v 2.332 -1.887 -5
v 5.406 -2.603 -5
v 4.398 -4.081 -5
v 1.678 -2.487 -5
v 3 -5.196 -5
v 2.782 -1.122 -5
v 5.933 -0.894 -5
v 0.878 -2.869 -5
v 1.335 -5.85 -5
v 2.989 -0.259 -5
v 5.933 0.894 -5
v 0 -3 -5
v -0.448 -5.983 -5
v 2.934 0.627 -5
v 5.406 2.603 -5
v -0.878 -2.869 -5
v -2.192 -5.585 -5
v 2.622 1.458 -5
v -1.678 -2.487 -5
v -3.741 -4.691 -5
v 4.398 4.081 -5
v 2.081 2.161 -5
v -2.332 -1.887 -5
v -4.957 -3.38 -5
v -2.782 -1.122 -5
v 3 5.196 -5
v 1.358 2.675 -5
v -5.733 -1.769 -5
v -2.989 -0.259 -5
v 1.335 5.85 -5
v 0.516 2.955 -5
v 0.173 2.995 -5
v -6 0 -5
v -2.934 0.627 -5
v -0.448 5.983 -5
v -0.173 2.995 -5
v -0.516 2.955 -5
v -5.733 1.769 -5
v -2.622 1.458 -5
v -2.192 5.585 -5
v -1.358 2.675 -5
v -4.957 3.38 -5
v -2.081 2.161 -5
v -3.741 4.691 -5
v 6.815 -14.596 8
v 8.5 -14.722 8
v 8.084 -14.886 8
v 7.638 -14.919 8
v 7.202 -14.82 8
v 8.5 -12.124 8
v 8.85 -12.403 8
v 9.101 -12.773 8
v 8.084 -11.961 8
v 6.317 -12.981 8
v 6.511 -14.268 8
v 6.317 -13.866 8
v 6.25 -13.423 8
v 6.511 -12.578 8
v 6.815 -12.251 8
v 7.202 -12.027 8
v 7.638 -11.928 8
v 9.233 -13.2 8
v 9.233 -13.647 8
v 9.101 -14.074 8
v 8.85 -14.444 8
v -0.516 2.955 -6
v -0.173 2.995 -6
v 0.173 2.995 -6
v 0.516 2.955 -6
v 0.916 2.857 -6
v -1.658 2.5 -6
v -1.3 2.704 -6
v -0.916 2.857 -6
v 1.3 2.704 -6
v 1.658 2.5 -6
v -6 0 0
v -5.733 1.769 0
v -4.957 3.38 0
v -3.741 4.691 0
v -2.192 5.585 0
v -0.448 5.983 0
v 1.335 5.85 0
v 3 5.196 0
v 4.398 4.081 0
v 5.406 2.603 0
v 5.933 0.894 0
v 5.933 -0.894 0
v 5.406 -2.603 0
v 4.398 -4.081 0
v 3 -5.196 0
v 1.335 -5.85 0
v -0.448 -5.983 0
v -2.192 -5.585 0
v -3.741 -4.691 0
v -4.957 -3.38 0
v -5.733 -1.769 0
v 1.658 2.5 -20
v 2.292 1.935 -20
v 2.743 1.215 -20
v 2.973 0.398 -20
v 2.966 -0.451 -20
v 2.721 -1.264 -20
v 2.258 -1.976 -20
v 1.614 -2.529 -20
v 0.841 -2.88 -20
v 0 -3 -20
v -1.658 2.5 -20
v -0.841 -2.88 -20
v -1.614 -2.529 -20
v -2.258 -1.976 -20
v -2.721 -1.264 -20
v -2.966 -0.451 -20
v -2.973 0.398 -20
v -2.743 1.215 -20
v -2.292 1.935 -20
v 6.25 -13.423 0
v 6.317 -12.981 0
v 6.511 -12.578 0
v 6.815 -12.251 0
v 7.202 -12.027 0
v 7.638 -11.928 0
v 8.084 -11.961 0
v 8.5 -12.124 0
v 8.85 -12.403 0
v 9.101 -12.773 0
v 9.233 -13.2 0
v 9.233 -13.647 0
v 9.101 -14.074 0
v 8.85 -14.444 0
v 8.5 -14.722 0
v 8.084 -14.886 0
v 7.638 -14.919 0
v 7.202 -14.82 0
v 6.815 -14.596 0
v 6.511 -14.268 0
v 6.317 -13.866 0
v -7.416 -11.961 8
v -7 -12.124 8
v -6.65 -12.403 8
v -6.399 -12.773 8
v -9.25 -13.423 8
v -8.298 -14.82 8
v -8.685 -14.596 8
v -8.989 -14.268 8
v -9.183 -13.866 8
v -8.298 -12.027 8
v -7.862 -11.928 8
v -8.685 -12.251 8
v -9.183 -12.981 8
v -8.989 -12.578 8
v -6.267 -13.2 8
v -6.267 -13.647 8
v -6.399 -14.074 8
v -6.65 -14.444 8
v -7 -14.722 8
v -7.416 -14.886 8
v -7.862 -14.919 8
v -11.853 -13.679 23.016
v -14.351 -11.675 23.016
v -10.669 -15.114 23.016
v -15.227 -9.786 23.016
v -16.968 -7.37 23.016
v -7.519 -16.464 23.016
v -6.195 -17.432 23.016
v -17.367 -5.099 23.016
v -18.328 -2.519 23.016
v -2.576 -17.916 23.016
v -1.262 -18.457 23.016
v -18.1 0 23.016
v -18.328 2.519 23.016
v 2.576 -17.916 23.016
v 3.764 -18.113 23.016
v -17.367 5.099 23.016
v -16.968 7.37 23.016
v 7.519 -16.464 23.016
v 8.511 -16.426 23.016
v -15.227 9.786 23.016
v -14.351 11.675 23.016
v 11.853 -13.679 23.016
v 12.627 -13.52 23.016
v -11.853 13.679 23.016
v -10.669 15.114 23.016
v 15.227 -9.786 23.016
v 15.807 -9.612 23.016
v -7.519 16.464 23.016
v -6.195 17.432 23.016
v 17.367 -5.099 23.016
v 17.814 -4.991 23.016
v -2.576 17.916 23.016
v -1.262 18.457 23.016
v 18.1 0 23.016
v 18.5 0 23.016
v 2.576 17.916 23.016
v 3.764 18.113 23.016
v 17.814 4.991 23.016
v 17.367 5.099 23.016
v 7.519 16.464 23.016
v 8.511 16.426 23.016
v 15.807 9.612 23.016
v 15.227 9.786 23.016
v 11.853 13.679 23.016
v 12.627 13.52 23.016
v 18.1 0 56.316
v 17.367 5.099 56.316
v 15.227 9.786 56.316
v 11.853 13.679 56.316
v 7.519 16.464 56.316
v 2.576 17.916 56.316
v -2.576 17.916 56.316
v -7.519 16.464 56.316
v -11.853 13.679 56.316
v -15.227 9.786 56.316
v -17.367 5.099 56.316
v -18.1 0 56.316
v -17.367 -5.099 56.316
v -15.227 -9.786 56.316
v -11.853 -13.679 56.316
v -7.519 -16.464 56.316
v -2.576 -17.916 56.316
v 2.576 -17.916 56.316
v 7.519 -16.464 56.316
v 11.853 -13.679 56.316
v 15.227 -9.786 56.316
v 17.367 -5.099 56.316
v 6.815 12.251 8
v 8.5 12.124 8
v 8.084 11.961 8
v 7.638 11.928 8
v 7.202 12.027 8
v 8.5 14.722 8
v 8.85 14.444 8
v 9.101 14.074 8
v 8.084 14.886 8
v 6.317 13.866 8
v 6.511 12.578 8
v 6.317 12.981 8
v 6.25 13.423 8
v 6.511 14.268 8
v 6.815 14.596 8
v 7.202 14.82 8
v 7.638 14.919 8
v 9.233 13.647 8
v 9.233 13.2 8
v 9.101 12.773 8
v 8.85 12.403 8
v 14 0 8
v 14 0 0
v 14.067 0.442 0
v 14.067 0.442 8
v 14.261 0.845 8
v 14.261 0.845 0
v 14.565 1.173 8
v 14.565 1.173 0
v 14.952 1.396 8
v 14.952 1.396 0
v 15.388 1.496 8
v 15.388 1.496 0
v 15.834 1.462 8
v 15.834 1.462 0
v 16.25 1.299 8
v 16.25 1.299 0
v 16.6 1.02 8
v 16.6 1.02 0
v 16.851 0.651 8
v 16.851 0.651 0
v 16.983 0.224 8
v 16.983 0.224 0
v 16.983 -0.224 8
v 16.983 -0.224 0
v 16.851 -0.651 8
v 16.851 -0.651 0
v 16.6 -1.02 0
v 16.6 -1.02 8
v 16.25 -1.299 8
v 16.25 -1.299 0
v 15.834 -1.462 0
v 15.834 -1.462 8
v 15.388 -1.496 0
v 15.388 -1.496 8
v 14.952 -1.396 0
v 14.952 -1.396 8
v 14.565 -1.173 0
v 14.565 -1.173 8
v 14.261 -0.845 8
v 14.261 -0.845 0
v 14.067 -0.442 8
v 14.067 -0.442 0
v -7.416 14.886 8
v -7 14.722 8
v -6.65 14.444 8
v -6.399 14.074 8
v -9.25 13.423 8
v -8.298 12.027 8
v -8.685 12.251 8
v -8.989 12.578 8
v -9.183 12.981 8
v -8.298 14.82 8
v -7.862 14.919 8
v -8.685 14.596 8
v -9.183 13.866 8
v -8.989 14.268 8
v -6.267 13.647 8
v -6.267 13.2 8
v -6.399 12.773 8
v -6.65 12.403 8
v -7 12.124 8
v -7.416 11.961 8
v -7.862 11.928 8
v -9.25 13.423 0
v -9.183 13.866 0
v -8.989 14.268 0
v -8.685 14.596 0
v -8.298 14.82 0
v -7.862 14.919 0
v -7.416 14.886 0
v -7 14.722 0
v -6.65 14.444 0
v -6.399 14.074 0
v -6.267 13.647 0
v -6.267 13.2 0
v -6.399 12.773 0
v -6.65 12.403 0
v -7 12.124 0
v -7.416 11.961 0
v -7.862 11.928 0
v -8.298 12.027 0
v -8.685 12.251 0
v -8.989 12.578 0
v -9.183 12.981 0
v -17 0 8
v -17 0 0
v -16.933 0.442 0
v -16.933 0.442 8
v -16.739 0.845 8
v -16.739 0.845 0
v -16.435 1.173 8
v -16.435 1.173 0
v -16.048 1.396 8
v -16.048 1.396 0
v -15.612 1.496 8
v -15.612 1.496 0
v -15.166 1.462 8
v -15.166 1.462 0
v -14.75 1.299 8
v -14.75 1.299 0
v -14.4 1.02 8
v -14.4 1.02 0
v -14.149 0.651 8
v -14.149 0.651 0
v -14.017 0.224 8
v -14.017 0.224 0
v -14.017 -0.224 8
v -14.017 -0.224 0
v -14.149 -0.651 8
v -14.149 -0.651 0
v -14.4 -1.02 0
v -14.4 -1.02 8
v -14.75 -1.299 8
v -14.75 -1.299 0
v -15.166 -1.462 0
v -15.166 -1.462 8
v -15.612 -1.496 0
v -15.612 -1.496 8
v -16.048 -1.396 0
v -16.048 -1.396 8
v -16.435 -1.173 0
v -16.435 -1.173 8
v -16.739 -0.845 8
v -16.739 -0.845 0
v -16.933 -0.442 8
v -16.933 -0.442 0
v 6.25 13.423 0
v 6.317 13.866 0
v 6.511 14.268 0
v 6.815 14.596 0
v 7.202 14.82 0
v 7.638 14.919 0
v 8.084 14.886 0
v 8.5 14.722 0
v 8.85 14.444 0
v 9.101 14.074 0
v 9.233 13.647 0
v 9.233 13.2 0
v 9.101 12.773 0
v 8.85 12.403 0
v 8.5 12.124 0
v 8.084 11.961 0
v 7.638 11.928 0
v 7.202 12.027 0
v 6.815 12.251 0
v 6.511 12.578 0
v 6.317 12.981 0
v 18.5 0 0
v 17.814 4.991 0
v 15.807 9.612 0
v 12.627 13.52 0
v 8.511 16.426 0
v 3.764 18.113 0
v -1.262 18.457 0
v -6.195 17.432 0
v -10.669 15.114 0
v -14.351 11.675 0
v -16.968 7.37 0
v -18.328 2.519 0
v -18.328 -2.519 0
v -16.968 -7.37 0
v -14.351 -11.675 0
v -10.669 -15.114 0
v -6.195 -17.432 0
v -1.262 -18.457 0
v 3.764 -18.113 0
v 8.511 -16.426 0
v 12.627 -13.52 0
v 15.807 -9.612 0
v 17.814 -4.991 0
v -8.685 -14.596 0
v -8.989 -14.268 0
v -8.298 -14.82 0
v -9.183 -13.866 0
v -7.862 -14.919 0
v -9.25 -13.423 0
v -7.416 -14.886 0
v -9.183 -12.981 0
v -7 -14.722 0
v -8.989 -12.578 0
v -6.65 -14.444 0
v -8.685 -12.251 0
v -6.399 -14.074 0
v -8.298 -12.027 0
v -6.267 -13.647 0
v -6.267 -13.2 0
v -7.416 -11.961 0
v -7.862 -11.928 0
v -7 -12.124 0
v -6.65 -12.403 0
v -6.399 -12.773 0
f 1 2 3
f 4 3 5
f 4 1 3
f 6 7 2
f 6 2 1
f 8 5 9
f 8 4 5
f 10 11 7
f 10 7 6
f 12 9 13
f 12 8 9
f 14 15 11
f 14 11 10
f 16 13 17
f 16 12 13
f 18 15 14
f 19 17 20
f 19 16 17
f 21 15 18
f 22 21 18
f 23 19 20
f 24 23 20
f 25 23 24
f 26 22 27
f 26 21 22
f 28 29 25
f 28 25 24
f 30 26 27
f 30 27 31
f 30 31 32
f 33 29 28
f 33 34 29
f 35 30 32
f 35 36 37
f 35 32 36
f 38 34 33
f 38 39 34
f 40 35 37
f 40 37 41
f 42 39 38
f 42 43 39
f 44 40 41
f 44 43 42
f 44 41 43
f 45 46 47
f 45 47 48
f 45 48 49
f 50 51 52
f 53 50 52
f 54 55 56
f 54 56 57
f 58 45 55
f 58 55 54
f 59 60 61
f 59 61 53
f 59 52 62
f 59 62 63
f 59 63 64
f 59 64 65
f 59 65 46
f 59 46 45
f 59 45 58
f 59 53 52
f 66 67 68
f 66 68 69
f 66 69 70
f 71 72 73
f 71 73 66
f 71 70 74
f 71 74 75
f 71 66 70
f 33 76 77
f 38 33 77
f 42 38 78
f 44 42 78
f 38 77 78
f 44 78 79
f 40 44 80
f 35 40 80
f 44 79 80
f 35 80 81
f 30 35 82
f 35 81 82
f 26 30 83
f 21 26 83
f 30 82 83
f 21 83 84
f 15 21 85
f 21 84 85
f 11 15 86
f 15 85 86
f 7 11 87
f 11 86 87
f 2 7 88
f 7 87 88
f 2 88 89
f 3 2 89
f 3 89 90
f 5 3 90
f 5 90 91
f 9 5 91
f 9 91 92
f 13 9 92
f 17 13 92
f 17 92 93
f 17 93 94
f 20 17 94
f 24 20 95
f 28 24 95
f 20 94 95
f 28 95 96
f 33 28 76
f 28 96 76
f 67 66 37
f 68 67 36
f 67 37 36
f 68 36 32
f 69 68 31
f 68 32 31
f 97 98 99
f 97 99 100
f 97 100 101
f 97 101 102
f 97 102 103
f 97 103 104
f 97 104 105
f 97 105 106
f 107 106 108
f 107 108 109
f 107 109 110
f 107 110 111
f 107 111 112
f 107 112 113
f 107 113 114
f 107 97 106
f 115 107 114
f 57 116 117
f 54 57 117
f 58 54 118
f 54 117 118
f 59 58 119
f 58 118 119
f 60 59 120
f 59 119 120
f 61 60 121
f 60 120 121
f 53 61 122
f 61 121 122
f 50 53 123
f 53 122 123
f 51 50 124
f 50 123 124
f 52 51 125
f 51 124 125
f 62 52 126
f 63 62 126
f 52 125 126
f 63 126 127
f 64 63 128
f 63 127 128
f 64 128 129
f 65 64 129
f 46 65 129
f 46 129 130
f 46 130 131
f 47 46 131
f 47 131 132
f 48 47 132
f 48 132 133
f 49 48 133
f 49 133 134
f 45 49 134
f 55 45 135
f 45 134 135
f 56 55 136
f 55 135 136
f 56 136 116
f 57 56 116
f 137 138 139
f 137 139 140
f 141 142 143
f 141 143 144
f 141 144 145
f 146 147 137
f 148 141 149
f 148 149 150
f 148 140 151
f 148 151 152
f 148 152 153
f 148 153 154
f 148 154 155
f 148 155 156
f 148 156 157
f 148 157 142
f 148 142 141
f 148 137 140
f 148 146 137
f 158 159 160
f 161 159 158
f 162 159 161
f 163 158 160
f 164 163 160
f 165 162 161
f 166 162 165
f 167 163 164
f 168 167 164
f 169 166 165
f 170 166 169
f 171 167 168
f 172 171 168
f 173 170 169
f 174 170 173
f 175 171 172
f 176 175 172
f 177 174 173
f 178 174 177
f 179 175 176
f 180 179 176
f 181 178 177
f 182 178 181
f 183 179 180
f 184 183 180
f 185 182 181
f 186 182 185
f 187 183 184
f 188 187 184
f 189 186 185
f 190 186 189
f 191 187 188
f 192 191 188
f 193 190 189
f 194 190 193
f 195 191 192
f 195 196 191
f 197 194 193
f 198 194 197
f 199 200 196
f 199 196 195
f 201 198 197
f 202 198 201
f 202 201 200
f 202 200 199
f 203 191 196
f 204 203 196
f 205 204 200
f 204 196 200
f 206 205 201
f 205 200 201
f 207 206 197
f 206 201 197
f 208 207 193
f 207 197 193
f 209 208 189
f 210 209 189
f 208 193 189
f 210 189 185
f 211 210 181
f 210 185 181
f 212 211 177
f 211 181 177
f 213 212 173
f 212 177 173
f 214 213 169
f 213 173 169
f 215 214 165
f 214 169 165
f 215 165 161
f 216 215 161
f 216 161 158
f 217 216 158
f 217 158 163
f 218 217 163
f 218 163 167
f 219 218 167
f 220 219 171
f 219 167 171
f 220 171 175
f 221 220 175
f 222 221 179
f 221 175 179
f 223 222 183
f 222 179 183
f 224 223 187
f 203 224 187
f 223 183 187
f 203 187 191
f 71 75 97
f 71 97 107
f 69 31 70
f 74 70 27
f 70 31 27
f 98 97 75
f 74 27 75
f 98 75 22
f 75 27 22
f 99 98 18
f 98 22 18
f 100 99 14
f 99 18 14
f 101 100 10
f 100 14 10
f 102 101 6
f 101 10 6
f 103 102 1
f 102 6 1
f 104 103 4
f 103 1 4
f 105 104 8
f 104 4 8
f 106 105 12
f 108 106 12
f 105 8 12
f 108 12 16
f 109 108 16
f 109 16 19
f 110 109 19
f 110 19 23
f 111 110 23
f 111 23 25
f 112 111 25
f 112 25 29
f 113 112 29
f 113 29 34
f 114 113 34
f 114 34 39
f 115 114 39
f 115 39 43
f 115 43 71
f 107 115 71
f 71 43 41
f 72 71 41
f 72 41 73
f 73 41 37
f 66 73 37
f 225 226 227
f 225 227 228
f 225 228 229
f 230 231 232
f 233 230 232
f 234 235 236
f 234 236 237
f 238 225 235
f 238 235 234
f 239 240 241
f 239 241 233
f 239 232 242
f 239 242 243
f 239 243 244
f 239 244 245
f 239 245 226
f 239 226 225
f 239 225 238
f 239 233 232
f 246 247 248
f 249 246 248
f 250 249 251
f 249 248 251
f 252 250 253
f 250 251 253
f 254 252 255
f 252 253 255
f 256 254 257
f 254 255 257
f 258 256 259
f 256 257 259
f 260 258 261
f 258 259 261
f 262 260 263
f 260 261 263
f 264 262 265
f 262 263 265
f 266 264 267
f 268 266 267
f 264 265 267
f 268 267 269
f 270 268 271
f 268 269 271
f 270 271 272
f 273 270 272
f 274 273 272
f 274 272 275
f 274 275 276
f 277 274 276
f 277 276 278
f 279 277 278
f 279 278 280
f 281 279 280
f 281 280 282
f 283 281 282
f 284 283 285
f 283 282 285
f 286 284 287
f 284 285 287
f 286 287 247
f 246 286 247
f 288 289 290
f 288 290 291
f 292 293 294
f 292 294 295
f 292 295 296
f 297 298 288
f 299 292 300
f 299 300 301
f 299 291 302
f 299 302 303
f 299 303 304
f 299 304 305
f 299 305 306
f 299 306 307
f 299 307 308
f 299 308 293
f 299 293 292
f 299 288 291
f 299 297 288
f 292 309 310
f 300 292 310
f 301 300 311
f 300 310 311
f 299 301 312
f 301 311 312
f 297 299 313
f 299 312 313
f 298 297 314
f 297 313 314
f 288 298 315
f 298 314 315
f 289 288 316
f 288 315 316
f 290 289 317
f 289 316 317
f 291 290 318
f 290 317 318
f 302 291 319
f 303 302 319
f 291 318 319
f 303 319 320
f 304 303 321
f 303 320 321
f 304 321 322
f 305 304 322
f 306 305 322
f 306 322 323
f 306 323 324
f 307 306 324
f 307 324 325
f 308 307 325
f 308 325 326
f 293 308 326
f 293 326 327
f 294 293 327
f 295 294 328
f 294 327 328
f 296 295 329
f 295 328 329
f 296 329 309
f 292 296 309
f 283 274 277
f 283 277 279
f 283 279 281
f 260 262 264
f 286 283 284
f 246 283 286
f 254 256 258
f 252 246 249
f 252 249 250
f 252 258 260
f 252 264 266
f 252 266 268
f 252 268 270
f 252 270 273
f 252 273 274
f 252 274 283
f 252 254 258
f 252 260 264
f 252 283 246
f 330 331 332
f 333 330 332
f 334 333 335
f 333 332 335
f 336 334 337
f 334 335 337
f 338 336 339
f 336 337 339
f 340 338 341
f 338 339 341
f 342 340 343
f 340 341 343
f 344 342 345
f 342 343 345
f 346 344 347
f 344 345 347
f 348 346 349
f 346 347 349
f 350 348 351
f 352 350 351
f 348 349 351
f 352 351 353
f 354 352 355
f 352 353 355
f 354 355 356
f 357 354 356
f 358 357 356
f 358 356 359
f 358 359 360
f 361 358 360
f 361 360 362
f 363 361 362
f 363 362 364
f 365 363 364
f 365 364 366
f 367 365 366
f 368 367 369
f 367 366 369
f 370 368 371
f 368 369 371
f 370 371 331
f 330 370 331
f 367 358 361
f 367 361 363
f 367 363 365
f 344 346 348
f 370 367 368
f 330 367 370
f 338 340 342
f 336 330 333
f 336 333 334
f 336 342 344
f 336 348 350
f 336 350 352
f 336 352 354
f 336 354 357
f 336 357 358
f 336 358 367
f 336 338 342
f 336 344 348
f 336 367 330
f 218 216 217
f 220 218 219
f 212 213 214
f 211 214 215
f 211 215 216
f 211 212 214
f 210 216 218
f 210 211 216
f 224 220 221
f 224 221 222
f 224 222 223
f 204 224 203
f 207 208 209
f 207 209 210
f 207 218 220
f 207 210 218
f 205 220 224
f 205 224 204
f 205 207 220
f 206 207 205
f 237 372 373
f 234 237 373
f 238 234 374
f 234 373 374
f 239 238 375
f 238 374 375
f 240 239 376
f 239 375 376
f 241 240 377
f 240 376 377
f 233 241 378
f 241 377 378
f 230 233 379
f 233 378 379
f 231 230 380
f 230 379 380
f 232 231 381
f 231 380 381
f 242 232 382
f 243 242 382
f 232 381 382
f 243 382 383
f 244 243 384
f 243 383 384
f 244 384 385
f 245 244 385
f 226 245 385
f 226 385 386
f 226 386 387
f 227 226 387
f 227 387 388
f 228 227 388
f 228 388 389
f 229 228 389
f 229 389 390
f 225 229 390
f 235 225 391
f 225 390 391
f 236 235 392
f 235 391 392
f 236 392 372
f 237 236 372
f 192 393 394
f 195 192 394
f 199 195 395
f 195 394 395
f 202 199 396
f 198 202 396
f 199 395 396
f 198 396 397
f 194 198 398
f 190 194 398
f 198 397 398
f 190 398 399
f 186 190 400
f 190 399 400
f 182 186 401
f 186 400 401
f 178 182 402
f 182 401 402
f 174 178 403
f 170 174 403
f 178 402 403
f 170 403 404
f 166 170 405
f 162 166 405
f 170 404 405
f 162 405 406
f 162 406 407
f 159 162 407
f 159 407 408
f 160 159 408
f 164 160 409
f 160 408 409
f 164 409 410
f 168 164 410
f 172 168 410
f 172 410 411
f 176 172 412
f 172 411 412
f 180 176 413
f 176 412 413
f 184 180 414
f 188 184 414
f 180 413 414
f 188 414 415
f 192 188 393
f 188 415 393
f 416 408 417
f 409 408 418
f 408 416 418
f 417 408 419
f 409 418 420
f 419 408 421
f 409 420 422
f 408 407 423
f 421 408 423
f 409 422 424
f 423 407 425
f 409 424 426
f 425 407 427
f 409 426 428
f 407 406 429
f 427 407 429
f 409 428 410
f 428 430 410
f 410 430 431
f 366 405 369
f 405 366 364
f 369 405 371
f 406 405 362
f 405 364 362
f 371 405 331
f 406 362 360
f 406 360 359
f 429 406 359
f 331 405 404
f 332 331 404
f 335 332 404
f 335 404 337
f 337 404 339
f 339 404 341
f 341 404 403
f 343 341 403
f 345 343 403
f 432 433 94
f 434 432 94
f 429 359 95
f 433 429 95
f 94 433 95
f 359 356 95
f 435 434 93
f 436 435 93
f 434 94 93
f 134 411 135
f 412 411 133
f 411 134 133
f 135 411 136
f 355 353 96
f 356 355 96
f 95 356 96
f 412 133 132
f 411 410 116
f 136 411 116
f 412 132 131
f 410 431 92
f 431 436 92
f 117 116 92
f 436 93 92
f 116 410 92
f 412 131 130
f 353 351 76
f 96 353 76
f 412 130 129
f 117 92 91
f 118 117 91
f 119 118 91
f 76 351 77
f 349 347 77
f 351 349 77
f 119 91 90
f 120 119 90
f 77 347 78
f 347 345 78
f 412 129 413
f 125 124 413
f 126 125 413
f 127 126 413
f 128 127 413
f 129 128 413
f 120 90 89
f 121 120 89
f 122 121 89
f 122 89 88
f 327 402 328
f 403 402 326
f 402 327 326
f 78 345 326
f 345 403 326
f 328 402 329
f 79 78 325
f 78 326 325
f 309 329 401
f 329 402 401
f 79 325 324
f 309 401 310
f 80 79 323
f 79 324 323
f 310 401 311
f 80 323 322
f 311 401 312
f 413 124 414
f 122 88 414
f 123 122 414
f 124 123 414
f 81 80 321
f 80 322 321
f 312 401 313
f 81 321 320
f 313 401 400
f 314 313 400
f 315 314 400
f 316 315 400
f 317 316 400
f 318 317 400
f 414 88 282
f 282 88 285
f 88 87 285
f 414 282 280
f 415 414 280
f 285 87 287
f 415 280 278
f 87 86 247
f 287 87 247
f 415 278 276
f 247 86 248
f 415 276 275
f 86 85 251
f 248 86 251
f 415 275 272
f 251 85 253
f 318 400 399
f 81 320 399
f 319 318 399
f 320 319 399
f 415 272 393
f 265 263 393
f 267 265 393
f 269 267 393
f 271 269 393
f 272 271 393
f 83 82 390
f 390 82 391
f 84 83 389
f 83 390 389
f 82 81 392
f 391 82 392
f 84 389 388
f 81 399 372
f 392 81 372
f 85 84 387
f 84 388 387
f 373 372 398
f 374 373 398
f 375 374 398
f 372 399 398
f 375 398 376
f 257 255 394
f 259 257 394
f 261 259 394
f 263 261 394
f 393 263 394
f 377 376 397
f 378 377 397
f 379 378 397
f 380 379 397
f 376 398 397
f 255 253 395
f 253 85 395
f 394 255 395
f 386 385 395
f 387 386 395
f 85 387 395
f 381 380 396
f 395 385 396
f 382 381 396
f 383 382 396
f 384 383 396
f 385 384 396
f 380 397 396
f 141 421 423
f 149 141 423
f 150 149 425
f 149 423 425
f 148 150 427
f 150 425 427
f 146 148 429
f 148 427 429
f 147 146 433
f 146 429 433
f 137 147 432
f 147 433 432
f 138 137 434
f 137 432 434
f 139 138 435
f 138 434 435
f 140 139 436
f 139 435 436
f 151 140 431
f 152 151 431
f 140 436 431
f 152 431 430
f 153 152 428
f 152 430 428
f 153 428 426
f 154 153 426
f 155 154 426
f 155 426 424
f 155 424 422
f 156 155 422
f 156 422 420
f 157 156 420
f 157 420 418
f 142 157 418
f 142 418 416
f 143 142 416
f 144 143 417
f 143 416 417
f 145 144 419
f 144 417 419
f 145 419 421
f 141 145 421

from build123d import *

# Parameters (mm, degrees)
SKETCH1_R           = 18.5
BOSS_EXTRUDE1_DEPTH = 23.016176471
SKETCH2_R           = 18.1
BOSS_EXTRUDE2_DEPTH = 33.3
SKETCH3_R           = 6
BOSS_EXTRUDE3_DEPTH = 5
BOSS_EXTRUDE4_DEPTH = 15
CUT_EXTRUDE1_START  = -14
CUT_EXTRUDE1_DEPTH  = 14
SKETCH6_R           = 1.5
CUT_EXTRUDE2_DEPTH  = 8


with BuildPart() as part:
    # Sketch1 → Boss-Extrude1 (new body)
    with BuildSketch(Plane.XY):
        Circle(SKETCH1_R)
    extrude(amount=BOSS_EXTRUDE1_DEPTH)

    # Sketch2 → Boss-Extrude2 (add)
    with BuildSketch(Plane.XY.offset(23.016176471)):
        Circle(SKETCH2_R)
    extrude(amount=BOSS_EXTRUDE2_DEPTH)

    # Sketch3 → Boss-Extrude3 (add)
    with BuildSketch(Plane(origin=(0, 0, 0), x_dir=(-1, 0, 0), z_dir=(0, 0, -1))):
        Circle(SKETCH3_R)
    extrude(amount=BOSS_EXTRUDE3_DEPTH)

    # Sketch4 → Boss-Extrude4 (add)
    with BuildSketch(Plane(origin=(0, 0, -5), x_dir=(-1, 0, 0), z_dir=(0, 0, -1))):
        with BuildLine():
            ThreePointArc((-0.515876955, 2.95531233), (0, -3), (0.515876955, 2.95531233))
            ThreePointArc((0.515876955, 2.95531233), (0, 3), (-0.515876955, 2.95531233))
        make_face()
    extrude(amount=BOSS_EXTRUDE4_DEPTH)

    # Sketch5 → Cut-Extrude1 (cut)
    with BuildSketch(Plane(origin=(0, 0, -20), x_dir=(-1, 0, 0), z_dir=(0, 0, -1)).offset(CUT_EXTRUDE1_START)):
        with BuildLine():
            Line((-1.658312395, 2.5), (1.658312395, 2.5))
            ThreePointArc((1.658312395, 2.5), (0, 3), (-1.658312395, 2.5))
        make_face()
    extrude(amount=CUT_EXTRUDE1_DEPTH, mode=Mode.SUBTRACT)

    # Sketch6 → Cut-Extrude2 (cut)
    with BuildSketch(Plane(origin=(0, 0, 0), x_dir=(-1, 0, 0), z_dir=(0, 0, -1))):
        with Locations((7.75, 13.423393759)):
            Circle(SKETCH6_R)
        with Locations((15.5, 0)):
            Circle(SKETCH6_R)
        with Locations((7.75, -13.423393759)):
            Circle(SKETCH6_R)
        with Locations((-7.75, -13.423393759)):
            Circle(SKETCH6_R)
        with Locations((-15.5, 0)):
            Circle(SKETCH6_R)
        with Locations((-7.75, 13.423393759)):
            Circle(SKETCH6_R)
    extrude(amount=-CUT_EXTRUDE2_DEPTH, mode=Mode.SUBTRACT)


solid = part.part
